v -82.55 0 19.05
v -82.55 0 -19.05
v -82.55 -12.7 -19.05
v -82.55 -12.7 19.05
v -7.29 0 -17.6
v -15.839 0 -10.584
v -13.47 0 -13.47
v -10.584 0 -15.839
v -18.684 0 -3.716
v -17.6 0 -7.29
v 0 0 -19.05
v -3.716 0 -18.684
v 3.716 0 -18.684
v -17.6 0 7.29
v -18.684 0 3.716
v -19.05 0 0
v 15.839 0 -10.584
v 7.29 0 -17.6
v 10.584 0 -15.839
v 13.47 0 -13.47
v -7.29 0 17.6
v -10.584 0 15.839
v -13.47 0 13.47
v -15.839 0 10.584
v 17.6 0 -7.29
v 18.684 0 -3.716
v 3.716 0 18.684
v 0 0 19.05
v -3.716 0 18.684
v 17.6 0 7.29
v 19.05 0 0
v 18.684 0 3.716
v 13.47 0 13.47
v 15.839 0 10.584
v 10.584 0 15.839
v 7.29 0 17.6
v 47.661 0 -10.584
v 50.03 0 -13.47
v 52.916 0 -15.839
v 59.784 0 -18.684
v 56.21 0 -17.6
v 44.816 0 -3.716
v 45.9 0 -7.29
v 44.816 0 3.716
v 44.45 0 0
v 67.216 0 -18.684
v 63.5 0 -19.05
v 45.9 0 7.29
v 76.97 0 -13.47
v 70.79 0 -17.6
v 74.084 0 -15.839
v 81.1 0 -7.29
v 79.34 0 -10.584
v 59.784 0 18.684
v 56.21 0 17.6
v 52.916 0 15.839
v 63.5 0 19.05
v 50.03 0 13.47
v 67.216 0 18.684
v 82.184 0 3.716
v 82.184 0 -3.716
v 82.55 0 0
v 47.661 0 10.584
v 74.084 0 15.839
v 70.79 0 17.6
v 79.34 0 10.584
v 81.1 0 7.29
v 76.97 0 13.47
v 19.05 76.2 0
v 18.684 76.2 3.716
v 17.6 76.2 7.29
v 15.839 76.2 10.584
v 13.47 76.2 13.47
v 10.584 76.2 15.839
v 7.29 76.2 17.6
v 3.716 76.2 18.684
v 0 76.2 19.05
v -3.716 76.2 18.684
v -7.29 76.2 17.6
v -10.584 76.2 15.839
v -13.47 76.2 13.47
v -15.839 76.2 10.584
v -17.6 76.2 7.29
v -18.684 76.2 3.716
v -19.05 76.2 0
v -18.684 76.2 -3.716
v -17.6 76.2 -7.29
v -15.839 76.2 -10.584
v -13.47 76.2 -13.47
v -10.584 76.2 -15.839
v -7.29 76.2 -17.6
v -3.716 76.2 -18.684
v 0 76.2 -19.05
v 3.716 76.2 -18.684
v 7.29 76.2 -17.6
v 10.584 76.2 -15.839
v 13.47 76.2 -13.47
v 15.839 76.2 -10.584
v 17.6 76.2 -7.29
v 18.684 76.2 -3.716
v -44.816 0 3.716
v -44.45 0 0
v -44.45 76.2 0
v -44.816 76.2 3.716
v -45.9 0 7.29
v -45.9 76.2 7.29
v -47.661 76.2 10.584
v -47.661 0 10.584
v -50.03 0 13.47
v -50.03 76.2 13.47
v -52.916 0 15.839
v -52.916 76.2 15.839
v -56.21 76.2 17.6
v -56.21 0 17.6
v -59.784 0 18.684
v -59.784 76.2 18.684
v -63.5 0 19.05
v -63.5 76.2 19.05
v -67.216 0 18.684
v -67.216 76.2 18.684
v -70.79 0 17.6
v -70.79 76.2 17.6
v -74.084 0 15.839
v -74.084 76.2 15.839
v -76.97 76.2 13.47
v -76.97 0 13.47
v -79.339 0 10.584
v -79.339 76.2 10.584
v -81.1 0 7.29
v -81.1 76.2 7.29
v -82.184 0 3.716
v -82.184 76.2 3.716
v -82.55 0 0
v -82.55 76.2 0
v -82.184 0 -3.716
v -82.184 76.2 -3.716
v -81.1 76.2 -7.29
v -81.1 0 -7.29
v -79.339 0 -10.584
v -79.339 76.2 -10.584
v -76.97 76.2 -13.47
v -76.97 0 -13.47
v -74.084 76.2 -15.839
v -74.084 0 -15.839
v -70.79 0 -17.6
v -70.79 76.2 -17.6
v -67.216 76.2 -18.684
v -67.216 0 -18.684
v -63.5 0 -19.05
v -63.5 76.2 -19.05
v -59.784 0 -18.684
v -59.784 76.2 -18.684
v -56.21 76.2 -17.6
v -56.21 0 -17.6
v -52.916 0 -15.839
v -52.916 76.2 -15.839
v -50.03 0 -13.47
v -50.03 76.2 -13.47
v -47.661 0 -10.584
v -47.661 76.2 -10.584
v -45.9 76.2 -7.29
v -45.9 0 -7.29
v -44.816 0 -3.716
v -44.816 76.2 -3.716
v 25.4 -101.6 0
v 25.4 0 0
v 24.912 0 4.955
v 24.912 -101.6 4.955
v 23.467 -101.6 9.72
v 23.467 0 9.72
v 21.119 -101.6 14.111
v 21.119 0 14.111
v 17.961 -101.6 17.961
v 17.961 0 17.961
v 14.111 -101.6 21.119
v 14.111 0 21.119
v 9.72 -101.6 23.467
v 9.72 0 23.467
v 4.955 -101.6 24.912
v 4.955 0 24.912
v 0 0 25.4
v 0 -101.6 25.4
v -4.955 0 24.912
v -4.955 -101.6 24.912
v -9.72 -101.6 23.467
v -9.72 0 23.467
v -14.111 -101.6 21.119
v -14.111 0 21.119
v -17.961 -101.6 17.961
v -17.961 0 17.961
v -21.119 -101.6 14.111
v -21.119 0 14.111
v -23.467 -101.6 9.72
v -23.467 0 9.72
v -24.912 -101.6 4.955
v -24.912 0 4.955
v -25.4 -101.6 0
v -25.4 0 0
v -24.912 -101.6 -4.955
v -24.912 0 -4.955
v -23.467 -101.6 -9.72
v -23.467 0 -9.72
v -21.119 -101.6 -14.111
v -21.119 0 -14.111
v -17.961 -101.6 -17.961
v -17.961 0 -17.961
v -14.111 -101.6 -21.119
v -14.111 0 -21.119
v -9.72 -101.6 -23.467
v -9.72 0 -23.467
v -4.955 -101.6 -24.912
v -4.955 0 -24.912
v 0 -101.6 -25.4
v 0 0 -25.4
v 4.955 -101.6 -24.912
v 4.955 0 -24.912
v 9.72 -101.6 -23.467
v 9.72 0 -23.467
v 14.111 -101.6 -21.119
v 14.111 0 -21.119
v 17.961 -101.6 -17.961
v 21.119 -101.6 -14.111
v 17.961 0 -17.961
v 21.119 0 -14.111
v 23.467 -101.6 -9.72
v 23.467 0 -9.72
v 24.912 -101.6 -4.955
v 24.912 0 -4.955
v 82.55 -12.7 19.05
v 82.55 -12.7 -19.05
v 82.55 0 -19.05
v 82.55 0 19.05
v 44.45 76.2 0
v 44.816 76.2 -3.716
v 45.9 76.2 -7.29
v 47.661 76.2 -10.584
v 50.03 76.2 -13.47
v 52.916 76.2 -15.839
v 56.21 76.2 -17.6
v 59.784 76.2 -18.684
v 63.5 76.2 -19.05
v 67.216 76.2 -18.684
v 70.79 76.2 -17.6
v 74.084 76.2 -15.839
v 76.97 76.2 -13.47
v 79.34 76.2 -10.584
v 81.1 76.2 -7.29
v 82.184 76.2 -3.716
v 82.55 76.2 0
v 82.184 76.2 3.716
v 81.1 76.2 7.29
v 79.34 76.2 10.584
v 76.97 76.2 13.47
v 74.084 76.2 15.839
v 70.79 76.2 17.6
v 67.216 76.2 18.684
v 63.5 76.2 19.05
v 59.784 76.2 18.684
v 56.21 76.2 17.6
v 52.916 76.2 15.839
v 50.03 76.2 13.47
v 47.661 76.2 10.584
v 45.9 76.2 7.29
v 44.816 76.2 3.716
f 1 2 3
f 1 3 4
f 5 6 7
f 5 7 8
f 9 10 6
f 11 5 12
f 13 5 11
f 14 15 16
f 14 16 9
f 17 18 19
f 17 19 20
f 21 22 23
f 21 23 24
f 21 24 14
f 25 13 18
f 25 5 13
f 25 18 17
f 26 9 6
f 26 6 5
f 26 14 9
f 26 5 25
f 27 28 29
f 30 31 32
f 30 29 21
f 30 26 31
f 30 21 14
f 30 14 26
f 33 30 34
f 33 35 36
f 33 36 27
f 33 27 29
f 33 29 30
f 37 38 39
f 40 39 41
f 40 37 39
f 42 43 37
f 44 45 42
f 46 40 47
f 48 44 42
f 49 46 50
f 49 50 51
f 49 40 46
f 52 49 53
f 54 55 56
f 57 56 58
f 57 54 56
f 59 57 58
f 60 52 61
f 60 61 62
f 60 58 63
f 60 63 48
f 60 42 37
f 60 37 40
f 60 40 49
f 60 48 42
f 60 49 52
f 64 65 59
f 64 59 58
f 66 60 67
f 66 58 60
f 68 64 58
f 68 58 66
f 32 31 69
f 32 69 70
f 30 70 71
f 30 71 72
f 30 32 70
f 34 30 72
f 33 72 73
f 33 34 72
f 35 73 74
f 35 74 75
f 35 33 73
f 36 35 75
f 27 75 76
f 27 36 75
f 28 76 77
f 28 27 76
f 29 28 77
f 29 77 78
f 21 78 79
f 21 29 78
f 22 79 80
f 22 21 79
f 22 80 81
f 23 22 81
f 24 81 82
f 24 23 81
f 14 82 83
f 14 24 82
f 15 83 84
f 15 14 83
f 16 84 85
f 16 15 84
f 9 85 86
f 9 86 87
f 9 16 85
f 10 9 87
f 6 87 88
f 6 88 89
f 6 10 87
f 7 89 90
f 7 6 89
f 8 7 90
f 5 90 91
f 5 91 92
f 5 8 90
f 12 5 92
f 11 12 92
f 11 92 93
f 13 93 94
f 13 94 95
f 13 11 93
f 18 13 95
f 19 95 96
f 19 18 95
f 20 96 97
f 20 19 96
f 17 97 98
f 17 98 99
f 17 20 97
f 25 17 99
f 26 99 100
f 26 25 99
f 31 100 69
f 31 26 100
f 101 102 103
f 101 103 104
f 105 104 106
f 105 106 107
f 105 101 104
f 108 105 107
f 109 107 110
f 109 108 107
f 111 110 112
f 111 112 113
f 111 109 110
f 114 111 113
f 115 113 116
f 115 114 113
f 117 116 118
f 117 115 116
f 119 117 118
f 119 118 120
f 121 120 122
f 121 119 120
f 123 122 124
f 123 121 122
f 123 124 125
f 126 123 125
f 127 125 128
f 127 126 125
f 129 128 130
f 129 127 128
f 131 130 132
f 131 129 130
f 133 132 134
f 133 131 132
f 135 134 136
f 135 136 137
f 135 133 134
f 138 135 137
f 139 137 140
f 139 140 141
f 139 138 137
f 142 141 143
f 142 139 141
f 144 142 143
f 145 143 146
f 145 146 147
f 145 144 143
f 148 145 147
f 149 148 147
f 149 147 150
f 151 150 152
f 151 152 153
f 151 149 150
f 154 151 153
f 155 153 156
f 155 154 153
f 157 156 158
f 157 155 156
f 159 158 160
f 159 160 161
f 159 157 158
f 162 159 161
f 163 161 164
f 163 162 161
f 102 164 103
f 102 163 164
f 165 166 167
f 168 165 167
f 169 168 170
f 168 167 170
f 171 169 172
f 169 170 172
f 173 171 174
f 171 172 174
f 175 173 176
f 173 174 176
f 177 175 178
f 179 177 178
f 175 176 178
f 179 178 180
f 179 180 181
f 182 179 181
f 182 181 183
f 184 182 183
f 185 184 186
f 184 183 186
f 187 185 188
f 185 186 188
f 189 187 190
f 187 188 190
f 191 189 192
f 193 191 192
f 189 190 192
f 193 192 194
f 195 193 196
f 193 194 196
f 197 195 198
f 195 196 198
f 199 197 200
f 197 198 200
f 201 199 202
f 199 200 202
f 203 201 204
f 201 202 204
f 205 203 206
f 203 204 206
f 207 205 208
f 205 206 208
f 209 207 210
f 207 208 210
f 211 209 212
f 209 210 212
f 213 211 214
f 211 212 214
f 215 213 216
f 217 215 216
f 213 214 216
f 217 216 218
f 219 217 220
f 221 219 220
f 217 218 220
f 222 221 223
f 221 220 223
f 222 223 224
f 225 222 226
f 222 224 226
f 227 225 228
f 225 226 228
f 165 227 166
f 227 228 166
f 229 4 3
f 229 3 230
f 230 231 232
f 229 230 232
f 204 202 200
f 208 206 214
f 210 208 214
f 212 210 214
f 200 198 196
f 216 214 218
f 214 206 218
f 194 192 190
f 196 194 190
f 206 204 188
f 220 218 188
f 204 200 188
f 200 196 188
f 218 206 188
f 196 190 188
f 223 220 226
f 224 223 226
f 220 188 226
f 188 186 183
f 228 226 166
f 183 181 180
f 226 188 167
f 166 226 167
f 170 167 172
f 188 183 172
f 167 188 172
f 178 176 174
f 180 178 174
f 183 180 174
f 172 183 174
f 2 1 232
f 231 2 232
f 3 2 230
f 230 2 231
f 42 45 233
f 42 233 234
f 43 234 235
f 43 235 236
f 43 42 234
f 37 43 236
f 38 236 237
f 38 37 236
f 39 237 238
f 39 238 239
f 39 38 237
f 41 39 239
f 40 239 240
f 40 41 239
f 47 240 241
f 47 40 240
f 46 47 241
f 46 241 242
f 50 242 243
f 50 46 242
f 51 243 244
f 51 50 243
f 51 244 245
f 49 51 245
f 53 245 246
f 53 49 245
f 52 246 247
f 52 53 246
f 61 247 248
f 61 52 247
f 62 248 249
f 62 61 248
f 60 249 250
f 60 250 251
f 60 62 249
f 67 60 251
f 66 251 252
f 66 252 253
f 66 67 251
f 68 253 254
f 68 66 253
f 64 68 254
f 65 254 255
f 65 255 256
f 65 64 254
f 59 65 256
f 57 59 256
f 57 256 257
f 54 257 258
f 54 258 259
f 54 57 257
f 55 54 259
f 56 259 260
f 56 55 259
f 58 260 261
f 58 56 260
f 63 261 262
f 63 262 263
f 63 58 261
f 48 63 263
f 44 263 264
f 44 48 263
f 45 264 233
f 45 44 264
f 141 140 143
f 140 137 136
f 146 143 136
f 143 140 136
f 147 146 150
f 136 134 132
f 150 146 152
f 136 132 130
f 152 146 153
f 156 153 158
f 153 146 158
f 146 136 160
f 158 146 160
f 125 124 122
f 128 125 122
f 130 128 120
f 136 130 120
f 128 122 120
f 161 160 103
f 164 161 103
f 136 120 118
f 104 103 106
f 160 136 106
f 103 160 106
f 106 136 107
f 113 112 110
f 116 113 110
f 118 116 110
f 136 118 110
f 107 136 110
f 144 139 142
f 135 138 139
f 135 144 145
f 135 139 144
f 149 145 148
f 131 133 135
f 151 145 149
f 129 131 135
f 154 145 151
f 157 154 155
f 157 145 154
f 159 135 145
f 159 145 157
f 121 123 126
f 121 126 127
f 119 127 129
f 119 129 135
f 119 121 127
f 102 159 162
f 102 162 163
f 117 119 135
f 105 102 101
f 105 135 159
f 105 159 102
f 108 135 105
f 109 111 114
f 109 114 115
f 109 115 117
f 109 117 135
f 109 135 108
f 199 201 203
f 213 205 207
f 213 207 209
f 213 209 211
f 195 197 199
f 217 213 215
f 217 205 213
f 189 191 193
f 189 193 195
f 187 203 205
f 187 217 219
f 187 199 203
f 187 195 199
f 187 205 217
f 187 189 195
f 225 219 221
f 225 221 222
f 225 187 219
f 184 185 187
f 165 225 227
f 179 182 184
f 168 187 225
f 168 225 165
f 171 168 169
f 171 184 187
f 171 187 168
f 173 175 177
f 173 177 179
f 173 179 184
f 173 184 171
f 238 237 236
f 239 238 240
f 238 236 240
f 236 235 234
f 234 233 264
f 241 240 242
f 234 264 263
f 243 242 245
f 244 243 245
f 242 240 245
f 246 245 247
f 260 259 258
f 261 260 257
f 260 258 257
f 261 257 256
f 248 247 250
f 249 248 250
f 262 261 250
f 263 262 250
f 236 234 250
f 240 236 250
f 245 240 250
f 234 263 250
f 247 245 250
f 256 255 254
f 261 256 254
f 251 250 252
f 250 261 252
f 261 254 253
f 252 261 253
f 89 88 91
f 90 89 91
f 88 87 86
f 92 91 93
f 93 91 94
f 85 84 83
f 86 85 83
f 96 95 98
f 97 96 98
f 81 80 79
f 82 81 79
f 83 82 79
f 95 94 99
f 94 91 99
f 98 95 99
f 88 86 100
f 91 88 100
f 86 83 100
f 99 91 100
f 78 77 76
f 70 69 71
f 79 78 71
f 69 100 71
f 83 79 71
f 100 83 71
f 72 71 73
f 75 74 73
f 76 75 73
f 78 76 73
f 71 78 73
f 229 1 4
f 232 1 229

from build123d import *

# Parameters (mm, degrees)
F0_W     = 165.1
F0_H     = 38.1
F1_DEPTH = 12.7
F2_R     = 25.4
F3_DEPTH = 101.6
F4_R     = 19.05
F5_DEPTH = 76.2


with BuildPart() as f1:
    # F0 (on Front) → F1 (new body)
    with BuildSketch(Plane.XZ):
        Rectangle(F0_W, F0_H)
    extrude(amount=F1_DEPTH)


with BuildPart() as f3:
    # F2 (on Front) → F3 (new body)
    with BuildSketch(Plane.XZ):
        Circle(F2_R)
    extrude(amount=F3_DEPTH)


with BuildPart() as f5:
    # F4 (on Front) → F5 (new body)
    with BuildSketch(Plane.XZ):
        with BuildLine():
            Line((19.05, 0), (0, 0))
            Line((0, 0), (-19.05, 0))
            ThreePointArc((-19.05, 0), (0, -19.05), (19.05, 0))
        make_face()
        with BuildLine():
            Line((-19.05, 0), (0, 0))
            Line((0, 0), (19.05, 0))
            ThreePointArc((19.05, 0), (0, 19.05), (-19.05, 0))
        make_face()
        with Locations((-63.5, 0)):
            Circle(F4_R)
        with BuildLine():
            ThreePointArc((82.550005, 0), (63.500005, 19.05), (44.450005, 0))
            ThreePointArc((44.450005, 0), (63.500005, -19.05), (82.550005, 0))
        make_face()
    extrude(amount=-F5_DEPTH)


solid = Compound([f1.part, f3.part, f5.part])
